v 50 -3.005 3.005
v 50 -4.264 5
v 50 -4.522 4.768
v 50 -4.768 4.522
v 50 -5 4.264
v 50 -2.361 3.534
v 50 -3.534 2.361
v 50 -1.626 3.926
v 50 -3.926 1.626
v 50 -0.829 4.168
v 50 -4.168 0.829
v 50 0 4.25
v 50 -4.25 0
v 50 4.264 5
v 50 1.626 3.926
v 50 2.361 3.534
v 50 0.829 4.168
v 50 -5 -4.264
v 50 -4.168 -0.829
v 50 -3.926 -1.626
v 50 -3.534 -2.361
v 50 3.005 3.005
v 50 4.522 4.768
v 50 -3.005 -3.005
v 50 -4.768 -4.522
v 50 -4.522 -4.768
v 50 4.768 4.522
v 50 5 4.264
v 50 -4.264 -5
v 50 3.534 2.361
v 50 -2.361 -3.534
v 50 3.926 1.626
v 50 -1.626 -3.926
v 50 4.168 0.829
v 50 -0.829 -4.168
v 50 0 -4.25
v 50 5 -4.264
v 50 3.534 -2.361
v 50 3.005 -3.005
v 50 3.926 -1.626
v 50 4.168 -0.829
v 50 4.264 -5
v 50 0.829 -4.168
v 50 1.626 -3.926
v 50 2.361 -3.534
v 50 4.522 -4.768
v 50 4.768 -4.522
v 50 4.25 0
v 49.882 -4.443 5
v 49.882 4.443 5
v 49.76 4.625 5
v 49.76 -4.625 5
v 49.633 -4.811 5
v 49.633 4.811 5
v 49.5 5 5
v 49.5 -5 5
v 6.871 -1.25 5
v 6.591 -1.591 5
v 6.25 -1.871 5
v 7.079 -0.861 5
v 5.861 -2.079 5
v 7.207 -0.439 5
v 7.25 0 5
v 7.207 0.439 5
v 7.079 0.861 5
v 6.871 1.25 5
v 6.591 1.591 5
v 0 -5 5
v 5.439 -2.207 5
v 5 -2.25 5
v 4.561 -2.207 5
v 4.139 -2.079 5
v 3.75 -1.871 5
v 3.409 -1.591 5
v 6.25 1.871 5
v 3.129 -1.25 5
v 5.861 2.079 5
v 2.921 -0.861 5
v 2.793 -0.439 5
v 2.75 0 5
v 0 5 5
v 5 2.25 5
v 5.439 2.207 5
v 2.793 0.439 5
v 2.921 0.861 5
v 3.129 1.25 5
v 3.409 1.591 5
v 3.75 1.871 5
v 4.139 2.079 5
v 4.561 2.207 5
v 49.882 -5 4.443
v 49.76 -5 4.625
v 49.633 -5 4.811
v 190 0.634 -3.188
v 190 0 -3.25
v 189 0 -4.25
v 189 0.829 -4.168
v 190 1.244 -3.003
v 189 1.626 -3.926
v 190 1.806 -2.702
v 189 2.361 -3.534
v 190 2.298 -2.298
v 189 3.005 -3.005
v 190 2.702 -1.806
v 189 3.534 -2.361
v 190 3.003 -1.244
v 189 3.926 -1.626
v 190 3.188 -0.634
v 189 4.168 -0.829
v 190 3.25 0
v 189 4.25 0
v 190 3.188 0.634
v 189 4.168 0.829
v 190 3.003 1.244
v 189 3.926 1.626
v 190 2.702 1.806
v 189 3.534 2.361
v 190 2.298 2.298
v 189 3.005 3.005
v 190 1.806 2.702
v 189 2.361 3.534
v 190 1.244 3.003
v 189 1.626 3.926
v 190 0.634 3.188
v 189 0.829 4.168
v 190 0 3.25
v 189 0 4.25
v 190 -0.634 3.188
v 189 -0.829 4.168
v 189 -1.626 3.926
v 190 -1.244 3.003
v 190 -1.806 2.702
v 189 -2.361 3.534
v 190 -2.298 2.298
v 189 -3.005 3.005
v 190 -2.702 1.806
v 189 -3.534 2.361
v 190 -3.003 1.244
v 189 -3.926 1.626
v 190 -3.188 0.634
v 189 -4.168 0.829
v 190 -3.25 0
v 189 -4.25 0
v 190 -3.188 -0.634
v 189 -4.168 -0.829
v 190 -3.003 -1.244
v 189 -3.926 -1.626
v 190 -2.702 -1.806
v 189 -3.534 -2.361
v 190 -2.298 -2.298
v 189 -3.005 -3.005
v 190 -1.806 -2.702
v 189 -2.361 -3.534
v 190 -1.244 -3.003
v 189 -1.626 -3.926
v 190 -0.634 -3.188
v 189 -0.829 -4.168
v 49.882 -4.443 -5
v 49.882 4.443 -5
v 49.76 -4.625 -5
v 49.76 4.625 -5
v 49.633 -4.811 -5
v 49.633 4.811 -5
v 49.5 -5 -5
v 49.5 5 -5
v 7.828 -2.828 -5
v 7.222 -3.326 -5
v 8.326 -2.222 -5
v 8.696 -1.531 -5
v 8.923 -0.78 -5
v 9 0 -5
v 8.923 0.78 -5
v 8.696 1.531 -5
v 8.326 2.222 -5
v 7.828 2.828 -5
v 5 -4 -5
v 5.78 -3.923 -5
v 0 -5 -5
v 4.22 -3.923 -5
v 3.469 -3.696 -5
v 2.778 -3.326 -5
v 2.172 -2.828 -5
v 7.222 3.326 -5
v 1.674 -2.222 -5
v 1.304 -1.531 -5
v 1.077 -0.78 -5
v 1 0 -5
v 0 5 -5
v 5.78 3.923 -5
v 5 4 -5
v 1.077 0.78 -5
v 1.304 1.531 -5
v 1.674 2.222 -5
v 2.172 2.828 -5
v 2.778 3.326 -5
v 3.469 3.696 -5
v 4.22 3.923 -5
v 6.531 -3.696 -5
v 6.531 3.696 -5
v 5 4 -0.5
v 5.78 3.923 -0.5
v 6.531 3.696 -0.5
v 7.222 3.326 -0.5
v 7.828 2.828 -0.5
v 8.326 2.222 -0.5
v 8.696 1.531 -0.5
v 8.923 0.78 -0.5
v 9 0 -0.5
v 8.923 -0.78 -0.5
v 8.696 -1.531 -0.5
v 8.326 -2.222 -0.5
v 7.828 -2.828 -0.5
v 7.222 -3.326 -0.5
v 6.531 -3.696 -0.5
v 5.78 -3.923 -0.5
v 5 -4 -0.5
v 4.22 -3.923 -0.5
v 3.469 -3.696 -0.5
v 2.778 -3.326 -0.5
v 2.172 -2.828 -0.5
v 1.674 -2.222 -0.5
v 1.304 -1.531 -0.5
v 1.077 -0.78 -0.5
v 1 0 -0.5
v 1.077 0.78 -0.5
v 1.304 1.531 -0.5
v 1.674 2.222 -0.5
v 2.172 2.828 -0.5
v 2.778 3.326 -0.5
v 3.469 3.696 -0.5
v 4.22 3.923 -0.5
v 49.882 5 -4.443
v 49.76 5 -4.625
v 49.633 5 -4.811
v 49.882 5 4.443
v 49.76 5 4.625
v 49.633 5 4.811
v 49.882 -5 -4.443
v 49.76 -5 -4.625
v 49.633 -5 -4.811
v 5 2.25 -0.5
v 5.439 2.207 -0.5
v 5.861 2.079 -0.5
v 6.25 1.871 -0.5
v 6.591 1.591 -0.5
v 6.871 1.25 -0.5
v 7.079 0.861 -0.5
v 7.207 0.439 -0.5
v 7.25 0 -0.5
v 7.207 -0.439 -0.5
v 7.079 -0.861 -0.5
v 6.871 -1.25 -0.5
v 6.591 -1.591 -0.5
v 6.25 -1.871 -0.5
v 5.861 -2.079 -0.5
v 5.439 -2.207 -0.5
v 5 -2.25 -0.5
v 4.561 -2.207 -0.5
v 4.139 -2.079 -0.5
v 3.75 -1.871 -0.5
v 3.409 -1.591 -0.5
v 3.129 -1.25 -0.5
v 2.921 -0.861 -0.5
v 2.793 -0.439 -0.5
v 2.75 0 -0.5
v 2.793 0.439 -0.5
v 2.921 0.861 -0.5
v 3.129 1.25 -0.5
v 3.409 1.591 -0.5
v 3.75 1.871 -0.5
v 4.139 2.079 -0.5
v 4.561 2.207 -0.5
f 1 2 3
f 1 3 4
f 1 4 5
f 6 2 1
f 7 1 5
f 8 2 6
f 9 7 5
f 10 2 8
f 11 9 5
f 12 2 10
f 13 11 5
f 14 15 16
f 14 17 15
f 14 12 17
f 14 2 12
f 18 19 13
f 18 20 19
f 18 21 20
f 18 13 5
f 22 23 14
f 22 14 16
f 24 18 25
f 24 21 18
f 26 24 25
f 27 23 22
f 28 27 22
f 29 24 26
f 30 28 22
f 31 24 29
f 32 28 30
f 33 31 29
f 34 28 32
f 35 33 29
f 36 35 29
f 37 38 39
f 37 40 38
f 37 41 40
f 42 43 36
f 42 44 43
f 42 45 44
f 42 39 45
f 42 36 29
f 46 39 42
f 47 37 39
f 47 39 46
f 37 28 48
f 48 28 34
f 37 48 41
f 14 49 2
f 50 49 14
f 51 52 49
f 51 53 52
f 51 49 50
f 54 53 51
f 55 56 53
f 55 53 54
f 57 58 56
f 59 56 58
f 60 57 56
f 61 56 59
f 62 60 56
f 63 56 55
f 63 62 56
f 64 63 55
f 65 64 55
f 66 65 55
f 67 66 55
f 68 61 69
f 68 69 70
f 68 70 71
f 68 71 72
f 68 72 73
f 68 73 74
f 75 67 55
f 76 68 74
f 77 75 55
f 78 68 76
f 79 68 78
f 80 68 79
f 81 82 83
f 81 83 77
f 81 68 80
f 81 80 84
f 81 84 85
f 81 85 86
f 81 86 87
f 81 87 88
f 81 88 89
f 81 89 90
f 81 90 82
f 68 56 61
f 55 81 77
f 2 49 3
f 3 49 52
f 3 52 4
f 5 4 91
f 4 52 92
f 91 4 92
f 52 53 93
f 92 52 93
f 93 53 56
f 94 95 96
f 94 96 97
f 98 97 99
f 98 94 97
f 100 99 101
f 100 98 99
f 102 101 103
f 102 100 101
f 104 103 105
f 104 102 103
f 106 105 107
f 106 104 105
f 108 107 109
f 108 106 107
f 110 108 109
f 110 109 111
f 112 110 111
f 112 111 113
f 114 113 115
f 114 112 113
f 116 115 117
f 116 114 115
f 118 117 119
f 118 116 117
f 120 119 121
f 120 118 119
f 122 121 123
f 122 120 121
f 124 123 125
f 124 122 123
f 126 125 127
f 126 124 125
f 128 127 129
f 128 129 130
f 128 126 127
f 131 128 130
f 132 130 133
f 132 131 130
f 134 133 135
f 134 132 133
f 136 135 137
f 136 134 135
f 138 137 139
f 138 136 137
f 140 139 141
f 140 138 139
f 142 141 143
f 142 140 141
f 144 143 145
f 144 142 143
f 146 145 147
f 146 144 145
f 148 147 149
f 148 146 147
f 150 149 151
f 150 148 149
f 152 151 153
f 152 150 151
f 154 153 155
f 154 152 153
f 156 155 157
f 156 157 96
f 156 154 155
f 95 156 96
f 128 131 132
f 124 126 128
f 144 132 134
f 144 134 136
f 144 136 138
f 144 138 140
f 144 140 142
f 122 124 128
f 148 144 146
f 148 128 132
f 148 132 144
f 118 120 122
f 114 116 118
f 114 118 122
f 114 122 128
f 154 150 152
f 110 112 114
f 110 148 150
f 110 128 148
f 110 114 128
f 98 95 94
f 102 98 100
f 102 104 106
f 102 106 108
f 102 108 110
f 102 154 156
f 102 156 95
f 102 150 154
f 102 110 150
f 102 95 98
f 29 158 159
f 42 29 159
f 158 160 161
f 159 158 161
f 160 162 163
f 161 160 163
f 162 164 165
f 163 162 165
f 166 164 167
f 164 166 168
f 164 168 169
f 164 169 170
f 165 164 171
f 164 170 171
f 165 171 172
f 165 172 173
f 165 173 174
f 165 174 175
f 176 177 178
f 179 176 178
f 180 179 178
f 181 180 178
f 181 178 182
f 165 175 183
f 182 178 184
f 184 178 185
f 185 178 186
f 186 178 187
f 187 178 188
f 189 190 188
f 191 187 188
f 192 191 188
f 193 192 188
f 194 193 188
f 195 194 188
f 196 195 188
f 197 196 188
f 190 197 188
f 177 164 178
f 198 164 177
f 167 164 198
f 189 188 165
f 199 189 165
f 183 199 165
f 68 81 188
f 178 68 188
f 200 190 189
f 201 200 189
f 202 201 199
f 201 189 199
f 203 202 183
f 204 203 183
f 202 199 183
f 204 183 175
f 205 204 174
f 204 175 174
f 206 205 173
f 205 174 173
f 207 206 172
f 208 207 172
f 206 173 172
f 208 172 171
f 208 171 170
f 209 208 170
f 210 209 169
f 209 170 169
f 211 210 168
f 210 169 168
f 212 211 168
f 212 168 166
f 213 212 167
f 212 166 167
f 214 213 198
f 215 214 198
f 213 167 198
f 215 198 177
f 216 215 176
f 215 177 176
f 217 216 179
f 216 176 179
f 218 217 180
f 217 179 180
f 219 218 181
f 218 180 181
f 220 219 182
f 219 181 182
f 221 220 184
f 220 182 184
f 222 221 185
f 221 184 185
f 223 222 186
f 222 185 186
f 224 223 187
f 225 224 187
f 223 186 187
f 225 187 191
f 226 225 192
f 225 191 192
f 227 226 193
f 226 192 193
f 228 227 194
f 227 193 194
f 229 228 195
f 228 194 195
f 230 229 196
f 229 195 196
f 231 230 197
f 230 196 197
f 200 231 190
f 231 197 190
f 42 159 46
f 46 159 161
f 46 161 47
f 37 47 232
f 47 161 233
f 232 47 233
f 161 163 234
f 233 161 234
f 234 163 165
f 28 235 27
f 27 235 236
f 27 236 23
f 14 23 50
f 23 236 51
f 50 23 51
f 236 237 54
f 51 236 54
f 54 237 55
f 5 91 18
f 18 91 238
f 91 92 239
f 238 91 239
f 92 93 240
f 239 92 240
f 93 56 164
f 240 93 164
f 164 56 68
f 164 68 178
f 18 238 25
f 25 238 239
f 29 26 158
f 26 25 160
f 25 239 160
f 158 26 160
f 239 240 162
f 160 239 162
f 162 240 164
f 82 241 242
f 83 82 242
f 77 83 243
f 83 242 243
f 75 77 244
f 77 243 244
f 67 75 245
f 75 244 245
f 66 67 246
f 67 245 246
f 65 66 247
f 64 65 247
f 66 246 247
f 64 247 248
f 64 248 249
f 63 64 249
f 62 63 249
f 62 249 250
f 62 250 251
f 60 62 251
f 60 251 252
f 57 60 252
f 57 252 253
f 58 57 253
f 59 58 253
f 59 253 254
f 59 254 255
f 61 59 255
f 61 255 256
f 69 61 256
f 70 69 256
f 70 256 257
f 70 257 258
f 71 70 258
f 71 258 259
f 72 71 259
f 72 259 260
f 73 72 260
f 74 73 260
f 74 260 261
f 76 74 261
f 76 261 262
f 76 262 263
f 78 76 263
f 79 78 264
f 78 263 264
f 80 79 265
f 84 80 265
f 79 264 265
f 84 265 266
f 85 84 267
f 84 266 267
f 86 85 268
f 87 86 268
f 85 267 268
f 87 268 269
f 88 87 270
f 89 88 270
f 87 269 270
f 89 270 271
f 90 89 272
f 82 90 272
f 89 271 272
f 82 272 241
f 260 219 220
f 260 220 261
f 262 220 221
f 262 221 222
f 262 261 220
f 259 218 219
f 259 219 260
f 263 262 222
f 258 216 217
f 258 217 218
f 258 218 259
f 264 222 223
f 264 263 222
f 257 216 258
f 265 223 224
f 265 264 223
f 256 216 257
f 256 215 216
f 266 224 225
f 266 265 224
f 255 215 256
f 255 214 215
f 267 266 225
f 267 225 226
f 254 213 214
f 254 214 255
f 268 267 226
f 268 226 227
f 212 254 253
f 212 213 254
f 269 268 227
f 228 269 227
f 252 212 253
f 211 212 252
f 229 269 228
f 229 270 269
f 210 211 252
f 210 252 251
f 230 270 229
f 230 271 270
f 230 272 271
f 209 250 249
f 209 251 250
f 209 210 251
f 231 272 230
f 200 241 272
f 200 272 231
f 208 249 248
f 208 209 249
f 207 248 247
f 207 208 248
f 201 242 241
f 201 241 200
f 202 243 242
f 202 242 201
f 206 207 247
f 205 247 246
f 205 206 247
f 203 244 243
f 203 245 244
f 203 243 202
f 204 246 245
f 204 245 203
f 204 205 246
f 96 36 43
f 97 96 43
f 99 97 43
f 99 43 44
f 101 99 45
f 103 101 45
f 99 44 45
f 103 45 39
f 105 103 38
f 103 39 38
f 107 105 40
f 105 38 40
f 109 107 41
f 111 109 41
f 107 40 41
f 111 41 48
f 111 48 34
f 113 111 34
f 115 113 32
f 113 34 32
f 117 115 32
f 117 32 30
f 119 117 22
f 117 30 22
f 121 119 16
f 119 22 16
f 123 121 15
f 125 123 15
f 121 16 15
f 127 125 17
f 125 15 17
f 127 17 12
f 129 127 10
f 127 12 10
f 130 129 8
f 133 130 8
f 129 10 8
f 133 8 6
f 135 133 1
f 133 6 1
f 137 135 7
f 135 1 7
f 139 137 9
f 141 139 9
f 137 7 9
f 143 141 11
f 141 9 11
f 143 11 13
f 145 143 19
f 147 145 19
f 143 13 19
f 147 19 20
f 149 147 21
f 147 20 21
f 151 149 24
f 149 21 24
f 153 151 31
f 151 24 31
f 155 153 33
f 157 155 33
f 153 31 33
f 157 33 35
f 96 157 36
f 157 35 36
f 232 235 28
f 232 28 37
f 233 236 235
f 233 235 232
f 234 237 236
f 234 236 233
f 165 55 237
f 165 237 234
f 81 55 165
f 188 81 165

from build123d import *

# Parameters (mm, degrees)
SKETCH1_W           = 10
SKETCH1_H           = 10
BOSS_EXTRUDE1_DEPTH = 50
SKETCH3_R           = 4.25
BOSS_EXTRUDE2_DEPTH = 140
CHAMFER1_SIZE       = 1
SKETCH7_R           = 4
CUT_EXTRUDE3_DEPTH  = 4.5
SKETCH7_5_R         = 2.25
CUT_EXTRUDE4_DEPTH  = 20


with BuildPart() as part:
    # Sketch1 → Boss-Extrude1 (new body)
    with BuildSketch(Plane(origin=(0, 0, 0), x_dir=(0, 0, -1), z_dir=(1, 0, 0))):
        Rectangle(SKETCH1_W, SKETCH1_H)
    extrude(amount=BOSS_EXTRUDE1_DEPTH)

    # Sketch3 → Boss-Extrude2 (add)
    with BuildSketch(Plane(origin=(50, 0, 0), x_dir=(0, 0, -1), z_dir=(1, 0, 0))):
        Circle(SKETCH3_R)
    extrude(amount=BOSS_EXTRUDE2_DEPTH)

    # Chamfer1
    chamfer1_edges = [part.edges().sort_by_distance(p)[0] for p in [
        (190, 0, 4.25),
    ]]
    chamfer(chamfer1_edges, length=CHAMFER1_SIZE)

    # Sketch5 → Cut-Revolve1 (revolve, cut)
    with BuildSketch(Plane(origin=(0, 0, 0), x_dir=(-1, 0, 0), z_dir=(0, -0.7071067811865476, -0.7071067811865476))):
        Polygon((-50, 7.071067812), (-50, 6.571067812), (-49.5, 7.071067812), align=None)
    revolve(axis=Axis((-14.523088714, 0, 0), (1, 0, 0)), mode=Mode.SUBTRACT)

    # Sketch7 → Cut-Extrude3 (cut)
    with BuildSketch(Plane(origin=(0, 0, -5), x_dir=(-1, 0, 0), z_dir=(0, 0, -1))):
        with Locations((-5, 0)):
            Circle(SKETCH7_R)
    extrude(amount=-CUT_EXTRUDE3_DEPTH, mode=Mode.SUBTRACT)

    # Sketch7<5> → Cut-Extrude4 (cut)
    with BuildSketch(Plane(origin=(0, 0, -5), x_dir=(-1, 0, 0), z_dir=(0, 0, -1))):
        with Locations((-5, 0)):
            Circle(SKETCH7_5_R)
    extrude(amount=-CUT_EXTRUDE4_DEPTH, mode=Mode.SUBTRACT)


solid = part.part
